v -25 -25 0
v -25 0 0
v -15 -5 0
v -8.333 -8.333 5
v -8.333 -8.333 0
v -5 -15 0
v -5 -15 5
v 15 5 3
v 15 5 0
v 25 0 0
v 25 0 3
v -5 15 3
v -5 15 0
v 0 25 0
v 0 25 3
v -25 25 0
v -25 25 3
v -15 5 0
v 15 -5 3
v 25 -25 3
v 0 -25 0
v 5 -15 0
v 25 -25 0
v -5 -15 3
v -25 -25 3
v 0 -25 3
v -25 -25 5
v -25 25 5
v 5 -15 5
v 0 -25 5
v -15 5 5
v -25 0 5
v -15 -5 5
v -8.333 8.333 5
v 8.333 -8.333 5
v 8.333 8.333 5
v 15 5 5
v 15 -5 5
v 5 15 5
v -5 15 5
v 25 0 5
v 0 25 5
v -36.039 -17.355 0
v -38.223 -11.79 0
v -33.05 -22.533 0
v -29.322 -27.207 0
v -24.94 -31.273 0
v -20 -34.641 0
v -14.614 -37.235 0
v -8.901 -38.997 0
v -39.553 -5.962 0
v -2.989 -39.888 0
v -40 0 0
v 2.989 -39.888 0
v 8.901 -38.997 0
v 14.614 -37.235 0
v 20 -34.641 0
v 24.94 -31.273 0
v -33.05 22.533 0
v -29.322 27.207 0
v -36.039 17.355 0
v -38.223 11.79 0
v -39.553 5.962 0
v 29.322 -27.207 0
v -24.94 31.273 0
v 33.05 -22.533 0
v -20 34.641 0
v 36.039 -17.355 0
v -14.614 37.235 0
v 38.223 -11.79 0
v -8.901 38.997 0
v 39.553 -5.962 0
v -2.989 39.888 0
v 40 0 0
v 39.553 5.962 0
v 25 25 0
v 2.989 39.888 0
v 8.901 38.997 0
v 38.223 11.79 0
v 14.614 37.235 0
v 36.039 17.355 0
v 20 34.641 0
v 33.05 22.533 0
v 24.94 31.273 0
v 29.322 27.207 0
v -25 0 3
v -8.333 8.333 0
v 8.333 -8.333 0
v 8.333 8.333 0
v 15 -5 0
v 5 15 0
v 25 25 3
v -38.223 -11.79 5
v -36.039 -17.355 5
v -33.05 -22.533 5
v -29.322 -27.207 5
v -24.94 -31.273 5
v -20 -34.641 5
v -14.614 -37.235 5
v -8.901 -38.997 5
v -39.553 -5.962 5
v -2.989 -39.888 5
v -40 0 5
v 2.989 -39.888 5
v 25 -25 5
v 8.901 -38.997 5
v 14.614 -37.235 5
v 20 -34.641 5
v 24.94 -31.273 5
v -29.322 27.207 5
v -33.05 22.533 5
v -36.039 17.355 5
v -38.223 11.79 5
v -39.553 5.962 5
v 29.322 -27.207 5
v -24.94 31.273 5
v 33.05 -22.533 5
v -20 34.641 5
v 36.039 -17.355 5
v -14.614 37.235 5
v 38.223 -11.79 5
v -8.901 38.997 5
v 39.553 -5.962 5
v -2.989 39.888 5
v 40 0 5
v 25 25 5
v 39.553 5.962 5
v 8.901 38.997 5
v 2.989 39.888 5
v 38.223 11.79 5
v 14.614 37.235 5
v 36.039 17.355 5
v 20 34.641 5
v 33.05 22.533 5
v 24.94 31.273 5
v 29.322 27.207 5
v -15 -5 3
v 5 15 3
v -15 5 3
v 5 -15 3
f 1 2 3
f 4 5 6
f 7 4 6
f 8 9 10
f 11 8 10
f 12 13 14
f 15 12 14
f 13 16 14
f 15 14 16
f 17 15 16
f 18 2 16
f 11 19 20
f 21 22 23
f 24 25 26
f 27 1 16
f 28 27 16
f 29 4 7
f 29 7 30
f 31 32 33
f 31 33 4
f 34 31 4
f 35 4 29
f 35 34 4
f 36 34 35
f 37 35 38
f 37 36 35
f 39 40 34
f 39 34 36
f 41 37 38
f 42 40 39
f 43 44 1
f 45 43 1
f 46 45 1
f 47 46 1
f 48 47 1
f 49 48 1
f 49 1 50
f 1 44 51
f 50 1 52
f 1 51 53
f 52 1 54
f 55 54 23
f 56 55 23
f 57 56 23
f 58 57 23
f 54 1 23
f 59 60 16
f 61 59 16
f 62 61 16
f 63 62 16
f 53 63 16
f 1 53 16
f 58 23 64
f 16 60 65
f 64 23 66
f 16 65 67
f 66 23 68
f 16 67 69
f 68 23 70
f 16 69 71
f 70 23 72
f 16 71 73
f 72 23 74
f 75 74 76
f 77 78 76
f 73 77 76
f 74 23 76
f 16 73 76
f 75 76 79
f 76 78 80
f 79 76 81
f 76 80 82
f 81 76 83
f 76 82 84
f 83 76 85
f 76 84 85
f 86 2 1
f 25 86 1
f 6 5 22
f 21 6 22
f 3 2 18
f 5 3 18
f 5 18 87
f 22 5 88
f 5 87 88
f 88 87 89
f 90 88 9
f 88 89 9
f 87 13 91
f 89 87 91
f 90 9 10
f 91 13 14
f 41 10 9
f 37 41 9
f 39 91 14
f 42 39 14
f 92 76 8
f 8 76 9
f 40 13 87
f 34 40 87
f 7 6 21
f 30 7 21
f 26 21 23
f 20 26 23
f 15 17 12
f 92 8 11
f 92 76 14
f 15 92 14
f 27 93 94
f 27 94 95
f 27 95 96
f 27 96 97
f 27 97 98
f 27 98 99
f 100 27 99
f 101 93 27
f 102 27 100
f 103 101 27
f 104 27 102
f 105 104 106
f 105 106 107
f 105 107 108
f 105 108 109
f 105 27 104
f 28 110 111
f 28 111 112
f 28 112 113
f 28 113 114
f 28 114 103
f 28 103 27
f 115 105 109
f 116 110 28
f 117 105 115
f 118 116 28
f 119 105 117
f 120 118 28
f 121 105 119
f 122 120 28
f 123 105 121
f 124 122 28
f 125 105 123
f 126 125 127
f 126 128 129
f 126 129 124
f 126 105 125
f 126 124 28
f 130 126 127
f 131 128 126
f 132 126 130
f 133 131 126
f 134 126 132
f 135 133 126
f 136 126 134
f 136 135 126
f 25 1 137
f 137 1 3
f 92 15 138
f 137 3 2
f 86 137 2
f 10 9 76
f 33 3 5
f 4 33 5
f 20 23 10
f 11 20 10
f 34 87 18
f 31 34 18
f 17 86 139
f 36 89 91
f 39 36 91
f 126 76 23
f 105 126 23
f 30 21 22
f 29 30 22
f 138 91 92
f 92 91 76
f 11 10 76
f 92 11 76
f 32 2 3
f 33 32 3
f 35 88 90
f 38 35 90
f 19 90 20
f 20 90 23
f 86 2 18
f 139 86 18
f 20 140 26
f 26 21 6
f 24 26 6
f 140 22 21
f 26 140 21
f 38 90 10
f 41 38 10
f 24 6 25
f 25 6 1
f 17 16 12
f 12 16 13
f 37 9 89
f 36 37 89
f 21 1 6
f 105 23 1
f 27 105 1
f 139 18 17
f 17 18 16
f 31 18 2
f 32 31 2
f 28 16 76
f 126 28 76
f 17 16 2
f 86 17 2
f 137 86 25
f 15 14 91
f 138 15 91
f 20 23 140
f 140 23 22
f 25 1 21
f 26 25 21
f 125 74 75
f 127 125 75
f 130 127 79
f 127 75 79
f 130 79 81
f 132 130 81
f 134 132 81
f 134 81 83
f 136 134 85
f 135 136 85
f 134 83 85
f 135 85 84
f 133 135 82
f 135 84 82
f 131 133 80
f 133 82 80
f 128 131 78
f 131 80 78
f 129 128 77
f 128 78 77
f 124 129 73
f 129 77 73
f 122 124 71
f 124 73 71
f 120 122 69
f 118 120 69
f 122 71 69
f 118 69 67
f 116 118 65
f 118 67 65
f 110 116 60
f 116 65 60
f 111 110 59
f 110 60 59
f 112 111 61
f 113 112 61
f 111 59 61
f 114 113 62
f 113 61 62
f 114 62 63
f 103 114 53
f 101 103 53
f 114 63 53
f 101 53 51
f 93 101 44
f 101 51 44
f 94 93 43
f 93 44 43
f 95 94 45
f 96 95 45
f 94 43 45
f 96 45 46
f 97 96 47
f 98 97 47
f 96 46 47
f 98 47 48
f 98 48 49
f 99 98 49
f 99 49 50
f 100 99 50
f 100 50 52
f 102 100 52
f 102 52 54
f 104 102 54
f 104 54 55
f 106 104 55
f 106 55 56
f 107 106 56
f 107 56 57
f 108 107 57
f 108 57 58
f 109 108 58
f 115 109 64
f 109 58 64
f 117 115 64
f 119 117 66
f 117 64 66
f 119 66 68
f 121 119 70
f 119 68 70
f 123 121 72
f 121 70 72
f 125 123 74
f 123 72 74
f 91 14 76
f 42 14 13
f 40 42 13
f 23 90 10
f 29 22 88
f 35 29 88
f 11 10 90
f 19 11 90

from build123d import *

# Parameters (mm, degrees)
F0_R     = 40
F1_DEPTH = 5
F2_DEPTH = 3


with BuildPart() as f1:
    # F0 (on Top) → F1 (new body)
    with BuildSketch(Plane.XY):
        Circle(F0_R)
        Polygon((-25, 0), (-25, 25), (0, 25), (25, 25), (25, 0), (25, -25), (0, -25), (-25, -25), align=None, mode=Mode.SUBTRACT)
    extrude(amount=F1_DEPTH)


with BuildPart() as f1b:
    # F0 (on Top) → F1, piece 2 (new body)
    with BuildSketch(Plane.XY):
        Polygon((-15, 5), (-25, 0), (-15, -5), (-12.5, 0), align=None)
        Polygon((15, -5), (25, 0), (15, 5), (12.5, 0), align=None)
        Polygon((5, 15), (0, 25), (-5, 15), (0, 12.5), align=None)
        Polygon((-5, -15), (0, -25), (5, -15), (0, -12.5), align=None)
        Polygon((8.3333333333, 8.3333333333), (0, 12.5), (-8.3333333333, 8.3333333333), (-12.5, 0), (-8.3333333333, -8.3333333333), (0, -12.5), (8.3333333333, -8.3333333333), (12.5, 0), align=None)
        Polygon((-8.3333333333, 8.3333333333), (-15, 5), (-12.5, 0), align=None)
        Polygon((-12.5, 0), (-15, -5), (-8.3333333333, -8.3333333333), align=None)
        Polygon((-8.3333333333, -8.3333333333), (-5, -15), (0, -12.5), align=None)
        Polygon((0, -12.5), (5, -15), (8.3333333333, -8.3333333333), align=None)
        Polygon((8.3333333333, -8.3333333333), (15, -5), (12.5, 0), align=None)
        Polygon((12.5, 0), (15, 5), (8.3333333333, 8.3333333333), align=None)
        Polygon((8.3333333333, 8.3333333333), (5, 15), (0, 12.5), align=None)
        Polygon((0, 12.5), (-5, 15), (-8.3333333333, 8.3333333333), align=None)
    extrude(amount=F1_DEPTH)


with BuildPart() as f2:
    # F0 (on Top) → F2 (new body)
    with BuildSketch(Plane.XY):
        Polygon((-15, 5), (-25, 25), (-25, 0), align=None)
    extrude(amount=F2_DEPTH)


with BuildPart() as f2b:
    # F0 (on Top) → F2, piece 2 (new body)
    with BuildSketch(Plane.XY):
        Polygon((0, 25), (-25, 25), (-5, 15), align=None)
    extrude(amount=F2_DEPTH)


with BuildPart() as f2c:
    # F0 (on Top) → F2, piece 3 (new body)
    with BuildSketch(Plane.XY):
        Polygon((25, 25), (0, 25), (5, 15), align=None)
    extrude(amount=F2_DEPTH)


with BuildPart() as f2d:
    # F0 (on Top) → F2, piece 4 (new body)
    with BuildSketch(Plane.XY):
        Polygon((25, 0), (25, 25), (15, 5), align=None)
    extrude(amount=F2_DEPTH)


with BuildPart() as f2e:
    # F0 (on Top) → F2, piece 5 (new body)
    with BuildSketch(Plane.XY):
        Polygon((25, -25), (25, 0), (15, -5), align=None)
    extrude(amount=F2_DEPTH)


with BuildPart() as f2f:
    # F0 (on Top) → F2, piece 6 (new body)
    with BuildSketch(Plane.XY):
        Polygon((5, -15), (0, -25), (25, -25), align=None)
    extrude(amount=F2_DEPTH)


with BuildPart() as f2g:
    # F0 (on Top) → F2, piece 7 (new body)
    with BuildSketch(Plane.XY):
        Polygon((-5, -15), (-25, -25), (0, -25), align=None)
    extrude(amount=F2_DEPTH)


with BuildPart() as f2h:
    # F0 (on Top) → F2, piece 8 (new body)
    with BuildSketch(Plane.XY):
        Polygon((-15, -5), (-25, 0), (-25, -25), align=None)
    extrude(amount=F2_DEPTH)


solid = Compound([f1.part, f1b.part, f2.part, f2b.part, f2c.part, f2d.part, f2e.part, f2f.part, f2g.part, f2h.part])
